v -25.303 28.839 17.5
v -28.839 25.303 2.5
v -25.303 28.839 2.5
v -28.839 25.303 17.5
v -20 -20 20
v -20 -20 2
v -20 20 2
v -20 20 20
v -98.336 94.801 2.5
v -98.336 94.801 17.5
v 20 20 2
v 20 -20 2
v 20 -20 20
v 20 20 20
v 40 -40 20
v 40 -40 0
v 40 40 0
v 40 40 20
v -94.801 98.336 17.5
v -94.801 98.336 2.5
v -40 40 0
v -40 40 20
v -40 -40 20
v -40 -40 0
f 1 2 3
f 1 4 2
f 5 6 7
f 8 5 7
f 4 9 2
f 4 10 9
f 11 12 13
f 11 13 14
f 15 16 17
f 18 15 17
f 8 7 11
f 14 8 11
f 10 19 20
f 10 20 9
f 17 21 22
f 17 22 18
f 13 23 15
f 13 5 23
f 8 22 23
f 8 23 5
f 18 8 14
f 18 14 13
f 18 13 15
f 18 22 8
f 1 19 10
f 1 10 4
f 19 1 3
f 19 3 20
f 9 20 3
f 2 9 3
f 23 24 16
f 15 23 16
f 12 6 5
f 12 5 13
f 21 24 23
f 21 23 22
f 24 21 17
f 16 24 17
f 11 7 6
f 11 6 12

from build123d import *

# Parameters (mm, degrees)
F0_W     = 80
F0_H     = 80
F0_W_2   = 40
F0_H_2   = 40
F1_DEPTH = 20
F2_DEPTH = 2
F5_DEPTH = 7.5


with BuildPart() as f1:
    # F0 (on Top) → F1 (new body)
    with BuildSketch(Plane.XY):
        Rectangle(F0_W, F0_H)
        Rectangle(F0_W_2, F0_H_2, mode=Mode.SUBTRACT)
    extrude(amount=F1_DEPTH)

    # F0 (on Top) → F2 (join)
    with BuildSketch(Plane.XY):
        Rectangle(F0_W_2, F0_H_2)
    extrude(amount=F2_DEPTH)


with BuildPart() as f5:
    # F4 (on mid) → F5 (new body, symmetric)
    with BuildSketch(Plane.XY.offset(10)):
        Polygon((-28.838835, 25.303301), (-25.303301, 28.838835), (-94.800776, 98.336309), (-98.336309, 94.800776), align=None)
    extrude(amount=F5_DEPTH, both=True)


solid = Compound([f1.part, f5.part])
